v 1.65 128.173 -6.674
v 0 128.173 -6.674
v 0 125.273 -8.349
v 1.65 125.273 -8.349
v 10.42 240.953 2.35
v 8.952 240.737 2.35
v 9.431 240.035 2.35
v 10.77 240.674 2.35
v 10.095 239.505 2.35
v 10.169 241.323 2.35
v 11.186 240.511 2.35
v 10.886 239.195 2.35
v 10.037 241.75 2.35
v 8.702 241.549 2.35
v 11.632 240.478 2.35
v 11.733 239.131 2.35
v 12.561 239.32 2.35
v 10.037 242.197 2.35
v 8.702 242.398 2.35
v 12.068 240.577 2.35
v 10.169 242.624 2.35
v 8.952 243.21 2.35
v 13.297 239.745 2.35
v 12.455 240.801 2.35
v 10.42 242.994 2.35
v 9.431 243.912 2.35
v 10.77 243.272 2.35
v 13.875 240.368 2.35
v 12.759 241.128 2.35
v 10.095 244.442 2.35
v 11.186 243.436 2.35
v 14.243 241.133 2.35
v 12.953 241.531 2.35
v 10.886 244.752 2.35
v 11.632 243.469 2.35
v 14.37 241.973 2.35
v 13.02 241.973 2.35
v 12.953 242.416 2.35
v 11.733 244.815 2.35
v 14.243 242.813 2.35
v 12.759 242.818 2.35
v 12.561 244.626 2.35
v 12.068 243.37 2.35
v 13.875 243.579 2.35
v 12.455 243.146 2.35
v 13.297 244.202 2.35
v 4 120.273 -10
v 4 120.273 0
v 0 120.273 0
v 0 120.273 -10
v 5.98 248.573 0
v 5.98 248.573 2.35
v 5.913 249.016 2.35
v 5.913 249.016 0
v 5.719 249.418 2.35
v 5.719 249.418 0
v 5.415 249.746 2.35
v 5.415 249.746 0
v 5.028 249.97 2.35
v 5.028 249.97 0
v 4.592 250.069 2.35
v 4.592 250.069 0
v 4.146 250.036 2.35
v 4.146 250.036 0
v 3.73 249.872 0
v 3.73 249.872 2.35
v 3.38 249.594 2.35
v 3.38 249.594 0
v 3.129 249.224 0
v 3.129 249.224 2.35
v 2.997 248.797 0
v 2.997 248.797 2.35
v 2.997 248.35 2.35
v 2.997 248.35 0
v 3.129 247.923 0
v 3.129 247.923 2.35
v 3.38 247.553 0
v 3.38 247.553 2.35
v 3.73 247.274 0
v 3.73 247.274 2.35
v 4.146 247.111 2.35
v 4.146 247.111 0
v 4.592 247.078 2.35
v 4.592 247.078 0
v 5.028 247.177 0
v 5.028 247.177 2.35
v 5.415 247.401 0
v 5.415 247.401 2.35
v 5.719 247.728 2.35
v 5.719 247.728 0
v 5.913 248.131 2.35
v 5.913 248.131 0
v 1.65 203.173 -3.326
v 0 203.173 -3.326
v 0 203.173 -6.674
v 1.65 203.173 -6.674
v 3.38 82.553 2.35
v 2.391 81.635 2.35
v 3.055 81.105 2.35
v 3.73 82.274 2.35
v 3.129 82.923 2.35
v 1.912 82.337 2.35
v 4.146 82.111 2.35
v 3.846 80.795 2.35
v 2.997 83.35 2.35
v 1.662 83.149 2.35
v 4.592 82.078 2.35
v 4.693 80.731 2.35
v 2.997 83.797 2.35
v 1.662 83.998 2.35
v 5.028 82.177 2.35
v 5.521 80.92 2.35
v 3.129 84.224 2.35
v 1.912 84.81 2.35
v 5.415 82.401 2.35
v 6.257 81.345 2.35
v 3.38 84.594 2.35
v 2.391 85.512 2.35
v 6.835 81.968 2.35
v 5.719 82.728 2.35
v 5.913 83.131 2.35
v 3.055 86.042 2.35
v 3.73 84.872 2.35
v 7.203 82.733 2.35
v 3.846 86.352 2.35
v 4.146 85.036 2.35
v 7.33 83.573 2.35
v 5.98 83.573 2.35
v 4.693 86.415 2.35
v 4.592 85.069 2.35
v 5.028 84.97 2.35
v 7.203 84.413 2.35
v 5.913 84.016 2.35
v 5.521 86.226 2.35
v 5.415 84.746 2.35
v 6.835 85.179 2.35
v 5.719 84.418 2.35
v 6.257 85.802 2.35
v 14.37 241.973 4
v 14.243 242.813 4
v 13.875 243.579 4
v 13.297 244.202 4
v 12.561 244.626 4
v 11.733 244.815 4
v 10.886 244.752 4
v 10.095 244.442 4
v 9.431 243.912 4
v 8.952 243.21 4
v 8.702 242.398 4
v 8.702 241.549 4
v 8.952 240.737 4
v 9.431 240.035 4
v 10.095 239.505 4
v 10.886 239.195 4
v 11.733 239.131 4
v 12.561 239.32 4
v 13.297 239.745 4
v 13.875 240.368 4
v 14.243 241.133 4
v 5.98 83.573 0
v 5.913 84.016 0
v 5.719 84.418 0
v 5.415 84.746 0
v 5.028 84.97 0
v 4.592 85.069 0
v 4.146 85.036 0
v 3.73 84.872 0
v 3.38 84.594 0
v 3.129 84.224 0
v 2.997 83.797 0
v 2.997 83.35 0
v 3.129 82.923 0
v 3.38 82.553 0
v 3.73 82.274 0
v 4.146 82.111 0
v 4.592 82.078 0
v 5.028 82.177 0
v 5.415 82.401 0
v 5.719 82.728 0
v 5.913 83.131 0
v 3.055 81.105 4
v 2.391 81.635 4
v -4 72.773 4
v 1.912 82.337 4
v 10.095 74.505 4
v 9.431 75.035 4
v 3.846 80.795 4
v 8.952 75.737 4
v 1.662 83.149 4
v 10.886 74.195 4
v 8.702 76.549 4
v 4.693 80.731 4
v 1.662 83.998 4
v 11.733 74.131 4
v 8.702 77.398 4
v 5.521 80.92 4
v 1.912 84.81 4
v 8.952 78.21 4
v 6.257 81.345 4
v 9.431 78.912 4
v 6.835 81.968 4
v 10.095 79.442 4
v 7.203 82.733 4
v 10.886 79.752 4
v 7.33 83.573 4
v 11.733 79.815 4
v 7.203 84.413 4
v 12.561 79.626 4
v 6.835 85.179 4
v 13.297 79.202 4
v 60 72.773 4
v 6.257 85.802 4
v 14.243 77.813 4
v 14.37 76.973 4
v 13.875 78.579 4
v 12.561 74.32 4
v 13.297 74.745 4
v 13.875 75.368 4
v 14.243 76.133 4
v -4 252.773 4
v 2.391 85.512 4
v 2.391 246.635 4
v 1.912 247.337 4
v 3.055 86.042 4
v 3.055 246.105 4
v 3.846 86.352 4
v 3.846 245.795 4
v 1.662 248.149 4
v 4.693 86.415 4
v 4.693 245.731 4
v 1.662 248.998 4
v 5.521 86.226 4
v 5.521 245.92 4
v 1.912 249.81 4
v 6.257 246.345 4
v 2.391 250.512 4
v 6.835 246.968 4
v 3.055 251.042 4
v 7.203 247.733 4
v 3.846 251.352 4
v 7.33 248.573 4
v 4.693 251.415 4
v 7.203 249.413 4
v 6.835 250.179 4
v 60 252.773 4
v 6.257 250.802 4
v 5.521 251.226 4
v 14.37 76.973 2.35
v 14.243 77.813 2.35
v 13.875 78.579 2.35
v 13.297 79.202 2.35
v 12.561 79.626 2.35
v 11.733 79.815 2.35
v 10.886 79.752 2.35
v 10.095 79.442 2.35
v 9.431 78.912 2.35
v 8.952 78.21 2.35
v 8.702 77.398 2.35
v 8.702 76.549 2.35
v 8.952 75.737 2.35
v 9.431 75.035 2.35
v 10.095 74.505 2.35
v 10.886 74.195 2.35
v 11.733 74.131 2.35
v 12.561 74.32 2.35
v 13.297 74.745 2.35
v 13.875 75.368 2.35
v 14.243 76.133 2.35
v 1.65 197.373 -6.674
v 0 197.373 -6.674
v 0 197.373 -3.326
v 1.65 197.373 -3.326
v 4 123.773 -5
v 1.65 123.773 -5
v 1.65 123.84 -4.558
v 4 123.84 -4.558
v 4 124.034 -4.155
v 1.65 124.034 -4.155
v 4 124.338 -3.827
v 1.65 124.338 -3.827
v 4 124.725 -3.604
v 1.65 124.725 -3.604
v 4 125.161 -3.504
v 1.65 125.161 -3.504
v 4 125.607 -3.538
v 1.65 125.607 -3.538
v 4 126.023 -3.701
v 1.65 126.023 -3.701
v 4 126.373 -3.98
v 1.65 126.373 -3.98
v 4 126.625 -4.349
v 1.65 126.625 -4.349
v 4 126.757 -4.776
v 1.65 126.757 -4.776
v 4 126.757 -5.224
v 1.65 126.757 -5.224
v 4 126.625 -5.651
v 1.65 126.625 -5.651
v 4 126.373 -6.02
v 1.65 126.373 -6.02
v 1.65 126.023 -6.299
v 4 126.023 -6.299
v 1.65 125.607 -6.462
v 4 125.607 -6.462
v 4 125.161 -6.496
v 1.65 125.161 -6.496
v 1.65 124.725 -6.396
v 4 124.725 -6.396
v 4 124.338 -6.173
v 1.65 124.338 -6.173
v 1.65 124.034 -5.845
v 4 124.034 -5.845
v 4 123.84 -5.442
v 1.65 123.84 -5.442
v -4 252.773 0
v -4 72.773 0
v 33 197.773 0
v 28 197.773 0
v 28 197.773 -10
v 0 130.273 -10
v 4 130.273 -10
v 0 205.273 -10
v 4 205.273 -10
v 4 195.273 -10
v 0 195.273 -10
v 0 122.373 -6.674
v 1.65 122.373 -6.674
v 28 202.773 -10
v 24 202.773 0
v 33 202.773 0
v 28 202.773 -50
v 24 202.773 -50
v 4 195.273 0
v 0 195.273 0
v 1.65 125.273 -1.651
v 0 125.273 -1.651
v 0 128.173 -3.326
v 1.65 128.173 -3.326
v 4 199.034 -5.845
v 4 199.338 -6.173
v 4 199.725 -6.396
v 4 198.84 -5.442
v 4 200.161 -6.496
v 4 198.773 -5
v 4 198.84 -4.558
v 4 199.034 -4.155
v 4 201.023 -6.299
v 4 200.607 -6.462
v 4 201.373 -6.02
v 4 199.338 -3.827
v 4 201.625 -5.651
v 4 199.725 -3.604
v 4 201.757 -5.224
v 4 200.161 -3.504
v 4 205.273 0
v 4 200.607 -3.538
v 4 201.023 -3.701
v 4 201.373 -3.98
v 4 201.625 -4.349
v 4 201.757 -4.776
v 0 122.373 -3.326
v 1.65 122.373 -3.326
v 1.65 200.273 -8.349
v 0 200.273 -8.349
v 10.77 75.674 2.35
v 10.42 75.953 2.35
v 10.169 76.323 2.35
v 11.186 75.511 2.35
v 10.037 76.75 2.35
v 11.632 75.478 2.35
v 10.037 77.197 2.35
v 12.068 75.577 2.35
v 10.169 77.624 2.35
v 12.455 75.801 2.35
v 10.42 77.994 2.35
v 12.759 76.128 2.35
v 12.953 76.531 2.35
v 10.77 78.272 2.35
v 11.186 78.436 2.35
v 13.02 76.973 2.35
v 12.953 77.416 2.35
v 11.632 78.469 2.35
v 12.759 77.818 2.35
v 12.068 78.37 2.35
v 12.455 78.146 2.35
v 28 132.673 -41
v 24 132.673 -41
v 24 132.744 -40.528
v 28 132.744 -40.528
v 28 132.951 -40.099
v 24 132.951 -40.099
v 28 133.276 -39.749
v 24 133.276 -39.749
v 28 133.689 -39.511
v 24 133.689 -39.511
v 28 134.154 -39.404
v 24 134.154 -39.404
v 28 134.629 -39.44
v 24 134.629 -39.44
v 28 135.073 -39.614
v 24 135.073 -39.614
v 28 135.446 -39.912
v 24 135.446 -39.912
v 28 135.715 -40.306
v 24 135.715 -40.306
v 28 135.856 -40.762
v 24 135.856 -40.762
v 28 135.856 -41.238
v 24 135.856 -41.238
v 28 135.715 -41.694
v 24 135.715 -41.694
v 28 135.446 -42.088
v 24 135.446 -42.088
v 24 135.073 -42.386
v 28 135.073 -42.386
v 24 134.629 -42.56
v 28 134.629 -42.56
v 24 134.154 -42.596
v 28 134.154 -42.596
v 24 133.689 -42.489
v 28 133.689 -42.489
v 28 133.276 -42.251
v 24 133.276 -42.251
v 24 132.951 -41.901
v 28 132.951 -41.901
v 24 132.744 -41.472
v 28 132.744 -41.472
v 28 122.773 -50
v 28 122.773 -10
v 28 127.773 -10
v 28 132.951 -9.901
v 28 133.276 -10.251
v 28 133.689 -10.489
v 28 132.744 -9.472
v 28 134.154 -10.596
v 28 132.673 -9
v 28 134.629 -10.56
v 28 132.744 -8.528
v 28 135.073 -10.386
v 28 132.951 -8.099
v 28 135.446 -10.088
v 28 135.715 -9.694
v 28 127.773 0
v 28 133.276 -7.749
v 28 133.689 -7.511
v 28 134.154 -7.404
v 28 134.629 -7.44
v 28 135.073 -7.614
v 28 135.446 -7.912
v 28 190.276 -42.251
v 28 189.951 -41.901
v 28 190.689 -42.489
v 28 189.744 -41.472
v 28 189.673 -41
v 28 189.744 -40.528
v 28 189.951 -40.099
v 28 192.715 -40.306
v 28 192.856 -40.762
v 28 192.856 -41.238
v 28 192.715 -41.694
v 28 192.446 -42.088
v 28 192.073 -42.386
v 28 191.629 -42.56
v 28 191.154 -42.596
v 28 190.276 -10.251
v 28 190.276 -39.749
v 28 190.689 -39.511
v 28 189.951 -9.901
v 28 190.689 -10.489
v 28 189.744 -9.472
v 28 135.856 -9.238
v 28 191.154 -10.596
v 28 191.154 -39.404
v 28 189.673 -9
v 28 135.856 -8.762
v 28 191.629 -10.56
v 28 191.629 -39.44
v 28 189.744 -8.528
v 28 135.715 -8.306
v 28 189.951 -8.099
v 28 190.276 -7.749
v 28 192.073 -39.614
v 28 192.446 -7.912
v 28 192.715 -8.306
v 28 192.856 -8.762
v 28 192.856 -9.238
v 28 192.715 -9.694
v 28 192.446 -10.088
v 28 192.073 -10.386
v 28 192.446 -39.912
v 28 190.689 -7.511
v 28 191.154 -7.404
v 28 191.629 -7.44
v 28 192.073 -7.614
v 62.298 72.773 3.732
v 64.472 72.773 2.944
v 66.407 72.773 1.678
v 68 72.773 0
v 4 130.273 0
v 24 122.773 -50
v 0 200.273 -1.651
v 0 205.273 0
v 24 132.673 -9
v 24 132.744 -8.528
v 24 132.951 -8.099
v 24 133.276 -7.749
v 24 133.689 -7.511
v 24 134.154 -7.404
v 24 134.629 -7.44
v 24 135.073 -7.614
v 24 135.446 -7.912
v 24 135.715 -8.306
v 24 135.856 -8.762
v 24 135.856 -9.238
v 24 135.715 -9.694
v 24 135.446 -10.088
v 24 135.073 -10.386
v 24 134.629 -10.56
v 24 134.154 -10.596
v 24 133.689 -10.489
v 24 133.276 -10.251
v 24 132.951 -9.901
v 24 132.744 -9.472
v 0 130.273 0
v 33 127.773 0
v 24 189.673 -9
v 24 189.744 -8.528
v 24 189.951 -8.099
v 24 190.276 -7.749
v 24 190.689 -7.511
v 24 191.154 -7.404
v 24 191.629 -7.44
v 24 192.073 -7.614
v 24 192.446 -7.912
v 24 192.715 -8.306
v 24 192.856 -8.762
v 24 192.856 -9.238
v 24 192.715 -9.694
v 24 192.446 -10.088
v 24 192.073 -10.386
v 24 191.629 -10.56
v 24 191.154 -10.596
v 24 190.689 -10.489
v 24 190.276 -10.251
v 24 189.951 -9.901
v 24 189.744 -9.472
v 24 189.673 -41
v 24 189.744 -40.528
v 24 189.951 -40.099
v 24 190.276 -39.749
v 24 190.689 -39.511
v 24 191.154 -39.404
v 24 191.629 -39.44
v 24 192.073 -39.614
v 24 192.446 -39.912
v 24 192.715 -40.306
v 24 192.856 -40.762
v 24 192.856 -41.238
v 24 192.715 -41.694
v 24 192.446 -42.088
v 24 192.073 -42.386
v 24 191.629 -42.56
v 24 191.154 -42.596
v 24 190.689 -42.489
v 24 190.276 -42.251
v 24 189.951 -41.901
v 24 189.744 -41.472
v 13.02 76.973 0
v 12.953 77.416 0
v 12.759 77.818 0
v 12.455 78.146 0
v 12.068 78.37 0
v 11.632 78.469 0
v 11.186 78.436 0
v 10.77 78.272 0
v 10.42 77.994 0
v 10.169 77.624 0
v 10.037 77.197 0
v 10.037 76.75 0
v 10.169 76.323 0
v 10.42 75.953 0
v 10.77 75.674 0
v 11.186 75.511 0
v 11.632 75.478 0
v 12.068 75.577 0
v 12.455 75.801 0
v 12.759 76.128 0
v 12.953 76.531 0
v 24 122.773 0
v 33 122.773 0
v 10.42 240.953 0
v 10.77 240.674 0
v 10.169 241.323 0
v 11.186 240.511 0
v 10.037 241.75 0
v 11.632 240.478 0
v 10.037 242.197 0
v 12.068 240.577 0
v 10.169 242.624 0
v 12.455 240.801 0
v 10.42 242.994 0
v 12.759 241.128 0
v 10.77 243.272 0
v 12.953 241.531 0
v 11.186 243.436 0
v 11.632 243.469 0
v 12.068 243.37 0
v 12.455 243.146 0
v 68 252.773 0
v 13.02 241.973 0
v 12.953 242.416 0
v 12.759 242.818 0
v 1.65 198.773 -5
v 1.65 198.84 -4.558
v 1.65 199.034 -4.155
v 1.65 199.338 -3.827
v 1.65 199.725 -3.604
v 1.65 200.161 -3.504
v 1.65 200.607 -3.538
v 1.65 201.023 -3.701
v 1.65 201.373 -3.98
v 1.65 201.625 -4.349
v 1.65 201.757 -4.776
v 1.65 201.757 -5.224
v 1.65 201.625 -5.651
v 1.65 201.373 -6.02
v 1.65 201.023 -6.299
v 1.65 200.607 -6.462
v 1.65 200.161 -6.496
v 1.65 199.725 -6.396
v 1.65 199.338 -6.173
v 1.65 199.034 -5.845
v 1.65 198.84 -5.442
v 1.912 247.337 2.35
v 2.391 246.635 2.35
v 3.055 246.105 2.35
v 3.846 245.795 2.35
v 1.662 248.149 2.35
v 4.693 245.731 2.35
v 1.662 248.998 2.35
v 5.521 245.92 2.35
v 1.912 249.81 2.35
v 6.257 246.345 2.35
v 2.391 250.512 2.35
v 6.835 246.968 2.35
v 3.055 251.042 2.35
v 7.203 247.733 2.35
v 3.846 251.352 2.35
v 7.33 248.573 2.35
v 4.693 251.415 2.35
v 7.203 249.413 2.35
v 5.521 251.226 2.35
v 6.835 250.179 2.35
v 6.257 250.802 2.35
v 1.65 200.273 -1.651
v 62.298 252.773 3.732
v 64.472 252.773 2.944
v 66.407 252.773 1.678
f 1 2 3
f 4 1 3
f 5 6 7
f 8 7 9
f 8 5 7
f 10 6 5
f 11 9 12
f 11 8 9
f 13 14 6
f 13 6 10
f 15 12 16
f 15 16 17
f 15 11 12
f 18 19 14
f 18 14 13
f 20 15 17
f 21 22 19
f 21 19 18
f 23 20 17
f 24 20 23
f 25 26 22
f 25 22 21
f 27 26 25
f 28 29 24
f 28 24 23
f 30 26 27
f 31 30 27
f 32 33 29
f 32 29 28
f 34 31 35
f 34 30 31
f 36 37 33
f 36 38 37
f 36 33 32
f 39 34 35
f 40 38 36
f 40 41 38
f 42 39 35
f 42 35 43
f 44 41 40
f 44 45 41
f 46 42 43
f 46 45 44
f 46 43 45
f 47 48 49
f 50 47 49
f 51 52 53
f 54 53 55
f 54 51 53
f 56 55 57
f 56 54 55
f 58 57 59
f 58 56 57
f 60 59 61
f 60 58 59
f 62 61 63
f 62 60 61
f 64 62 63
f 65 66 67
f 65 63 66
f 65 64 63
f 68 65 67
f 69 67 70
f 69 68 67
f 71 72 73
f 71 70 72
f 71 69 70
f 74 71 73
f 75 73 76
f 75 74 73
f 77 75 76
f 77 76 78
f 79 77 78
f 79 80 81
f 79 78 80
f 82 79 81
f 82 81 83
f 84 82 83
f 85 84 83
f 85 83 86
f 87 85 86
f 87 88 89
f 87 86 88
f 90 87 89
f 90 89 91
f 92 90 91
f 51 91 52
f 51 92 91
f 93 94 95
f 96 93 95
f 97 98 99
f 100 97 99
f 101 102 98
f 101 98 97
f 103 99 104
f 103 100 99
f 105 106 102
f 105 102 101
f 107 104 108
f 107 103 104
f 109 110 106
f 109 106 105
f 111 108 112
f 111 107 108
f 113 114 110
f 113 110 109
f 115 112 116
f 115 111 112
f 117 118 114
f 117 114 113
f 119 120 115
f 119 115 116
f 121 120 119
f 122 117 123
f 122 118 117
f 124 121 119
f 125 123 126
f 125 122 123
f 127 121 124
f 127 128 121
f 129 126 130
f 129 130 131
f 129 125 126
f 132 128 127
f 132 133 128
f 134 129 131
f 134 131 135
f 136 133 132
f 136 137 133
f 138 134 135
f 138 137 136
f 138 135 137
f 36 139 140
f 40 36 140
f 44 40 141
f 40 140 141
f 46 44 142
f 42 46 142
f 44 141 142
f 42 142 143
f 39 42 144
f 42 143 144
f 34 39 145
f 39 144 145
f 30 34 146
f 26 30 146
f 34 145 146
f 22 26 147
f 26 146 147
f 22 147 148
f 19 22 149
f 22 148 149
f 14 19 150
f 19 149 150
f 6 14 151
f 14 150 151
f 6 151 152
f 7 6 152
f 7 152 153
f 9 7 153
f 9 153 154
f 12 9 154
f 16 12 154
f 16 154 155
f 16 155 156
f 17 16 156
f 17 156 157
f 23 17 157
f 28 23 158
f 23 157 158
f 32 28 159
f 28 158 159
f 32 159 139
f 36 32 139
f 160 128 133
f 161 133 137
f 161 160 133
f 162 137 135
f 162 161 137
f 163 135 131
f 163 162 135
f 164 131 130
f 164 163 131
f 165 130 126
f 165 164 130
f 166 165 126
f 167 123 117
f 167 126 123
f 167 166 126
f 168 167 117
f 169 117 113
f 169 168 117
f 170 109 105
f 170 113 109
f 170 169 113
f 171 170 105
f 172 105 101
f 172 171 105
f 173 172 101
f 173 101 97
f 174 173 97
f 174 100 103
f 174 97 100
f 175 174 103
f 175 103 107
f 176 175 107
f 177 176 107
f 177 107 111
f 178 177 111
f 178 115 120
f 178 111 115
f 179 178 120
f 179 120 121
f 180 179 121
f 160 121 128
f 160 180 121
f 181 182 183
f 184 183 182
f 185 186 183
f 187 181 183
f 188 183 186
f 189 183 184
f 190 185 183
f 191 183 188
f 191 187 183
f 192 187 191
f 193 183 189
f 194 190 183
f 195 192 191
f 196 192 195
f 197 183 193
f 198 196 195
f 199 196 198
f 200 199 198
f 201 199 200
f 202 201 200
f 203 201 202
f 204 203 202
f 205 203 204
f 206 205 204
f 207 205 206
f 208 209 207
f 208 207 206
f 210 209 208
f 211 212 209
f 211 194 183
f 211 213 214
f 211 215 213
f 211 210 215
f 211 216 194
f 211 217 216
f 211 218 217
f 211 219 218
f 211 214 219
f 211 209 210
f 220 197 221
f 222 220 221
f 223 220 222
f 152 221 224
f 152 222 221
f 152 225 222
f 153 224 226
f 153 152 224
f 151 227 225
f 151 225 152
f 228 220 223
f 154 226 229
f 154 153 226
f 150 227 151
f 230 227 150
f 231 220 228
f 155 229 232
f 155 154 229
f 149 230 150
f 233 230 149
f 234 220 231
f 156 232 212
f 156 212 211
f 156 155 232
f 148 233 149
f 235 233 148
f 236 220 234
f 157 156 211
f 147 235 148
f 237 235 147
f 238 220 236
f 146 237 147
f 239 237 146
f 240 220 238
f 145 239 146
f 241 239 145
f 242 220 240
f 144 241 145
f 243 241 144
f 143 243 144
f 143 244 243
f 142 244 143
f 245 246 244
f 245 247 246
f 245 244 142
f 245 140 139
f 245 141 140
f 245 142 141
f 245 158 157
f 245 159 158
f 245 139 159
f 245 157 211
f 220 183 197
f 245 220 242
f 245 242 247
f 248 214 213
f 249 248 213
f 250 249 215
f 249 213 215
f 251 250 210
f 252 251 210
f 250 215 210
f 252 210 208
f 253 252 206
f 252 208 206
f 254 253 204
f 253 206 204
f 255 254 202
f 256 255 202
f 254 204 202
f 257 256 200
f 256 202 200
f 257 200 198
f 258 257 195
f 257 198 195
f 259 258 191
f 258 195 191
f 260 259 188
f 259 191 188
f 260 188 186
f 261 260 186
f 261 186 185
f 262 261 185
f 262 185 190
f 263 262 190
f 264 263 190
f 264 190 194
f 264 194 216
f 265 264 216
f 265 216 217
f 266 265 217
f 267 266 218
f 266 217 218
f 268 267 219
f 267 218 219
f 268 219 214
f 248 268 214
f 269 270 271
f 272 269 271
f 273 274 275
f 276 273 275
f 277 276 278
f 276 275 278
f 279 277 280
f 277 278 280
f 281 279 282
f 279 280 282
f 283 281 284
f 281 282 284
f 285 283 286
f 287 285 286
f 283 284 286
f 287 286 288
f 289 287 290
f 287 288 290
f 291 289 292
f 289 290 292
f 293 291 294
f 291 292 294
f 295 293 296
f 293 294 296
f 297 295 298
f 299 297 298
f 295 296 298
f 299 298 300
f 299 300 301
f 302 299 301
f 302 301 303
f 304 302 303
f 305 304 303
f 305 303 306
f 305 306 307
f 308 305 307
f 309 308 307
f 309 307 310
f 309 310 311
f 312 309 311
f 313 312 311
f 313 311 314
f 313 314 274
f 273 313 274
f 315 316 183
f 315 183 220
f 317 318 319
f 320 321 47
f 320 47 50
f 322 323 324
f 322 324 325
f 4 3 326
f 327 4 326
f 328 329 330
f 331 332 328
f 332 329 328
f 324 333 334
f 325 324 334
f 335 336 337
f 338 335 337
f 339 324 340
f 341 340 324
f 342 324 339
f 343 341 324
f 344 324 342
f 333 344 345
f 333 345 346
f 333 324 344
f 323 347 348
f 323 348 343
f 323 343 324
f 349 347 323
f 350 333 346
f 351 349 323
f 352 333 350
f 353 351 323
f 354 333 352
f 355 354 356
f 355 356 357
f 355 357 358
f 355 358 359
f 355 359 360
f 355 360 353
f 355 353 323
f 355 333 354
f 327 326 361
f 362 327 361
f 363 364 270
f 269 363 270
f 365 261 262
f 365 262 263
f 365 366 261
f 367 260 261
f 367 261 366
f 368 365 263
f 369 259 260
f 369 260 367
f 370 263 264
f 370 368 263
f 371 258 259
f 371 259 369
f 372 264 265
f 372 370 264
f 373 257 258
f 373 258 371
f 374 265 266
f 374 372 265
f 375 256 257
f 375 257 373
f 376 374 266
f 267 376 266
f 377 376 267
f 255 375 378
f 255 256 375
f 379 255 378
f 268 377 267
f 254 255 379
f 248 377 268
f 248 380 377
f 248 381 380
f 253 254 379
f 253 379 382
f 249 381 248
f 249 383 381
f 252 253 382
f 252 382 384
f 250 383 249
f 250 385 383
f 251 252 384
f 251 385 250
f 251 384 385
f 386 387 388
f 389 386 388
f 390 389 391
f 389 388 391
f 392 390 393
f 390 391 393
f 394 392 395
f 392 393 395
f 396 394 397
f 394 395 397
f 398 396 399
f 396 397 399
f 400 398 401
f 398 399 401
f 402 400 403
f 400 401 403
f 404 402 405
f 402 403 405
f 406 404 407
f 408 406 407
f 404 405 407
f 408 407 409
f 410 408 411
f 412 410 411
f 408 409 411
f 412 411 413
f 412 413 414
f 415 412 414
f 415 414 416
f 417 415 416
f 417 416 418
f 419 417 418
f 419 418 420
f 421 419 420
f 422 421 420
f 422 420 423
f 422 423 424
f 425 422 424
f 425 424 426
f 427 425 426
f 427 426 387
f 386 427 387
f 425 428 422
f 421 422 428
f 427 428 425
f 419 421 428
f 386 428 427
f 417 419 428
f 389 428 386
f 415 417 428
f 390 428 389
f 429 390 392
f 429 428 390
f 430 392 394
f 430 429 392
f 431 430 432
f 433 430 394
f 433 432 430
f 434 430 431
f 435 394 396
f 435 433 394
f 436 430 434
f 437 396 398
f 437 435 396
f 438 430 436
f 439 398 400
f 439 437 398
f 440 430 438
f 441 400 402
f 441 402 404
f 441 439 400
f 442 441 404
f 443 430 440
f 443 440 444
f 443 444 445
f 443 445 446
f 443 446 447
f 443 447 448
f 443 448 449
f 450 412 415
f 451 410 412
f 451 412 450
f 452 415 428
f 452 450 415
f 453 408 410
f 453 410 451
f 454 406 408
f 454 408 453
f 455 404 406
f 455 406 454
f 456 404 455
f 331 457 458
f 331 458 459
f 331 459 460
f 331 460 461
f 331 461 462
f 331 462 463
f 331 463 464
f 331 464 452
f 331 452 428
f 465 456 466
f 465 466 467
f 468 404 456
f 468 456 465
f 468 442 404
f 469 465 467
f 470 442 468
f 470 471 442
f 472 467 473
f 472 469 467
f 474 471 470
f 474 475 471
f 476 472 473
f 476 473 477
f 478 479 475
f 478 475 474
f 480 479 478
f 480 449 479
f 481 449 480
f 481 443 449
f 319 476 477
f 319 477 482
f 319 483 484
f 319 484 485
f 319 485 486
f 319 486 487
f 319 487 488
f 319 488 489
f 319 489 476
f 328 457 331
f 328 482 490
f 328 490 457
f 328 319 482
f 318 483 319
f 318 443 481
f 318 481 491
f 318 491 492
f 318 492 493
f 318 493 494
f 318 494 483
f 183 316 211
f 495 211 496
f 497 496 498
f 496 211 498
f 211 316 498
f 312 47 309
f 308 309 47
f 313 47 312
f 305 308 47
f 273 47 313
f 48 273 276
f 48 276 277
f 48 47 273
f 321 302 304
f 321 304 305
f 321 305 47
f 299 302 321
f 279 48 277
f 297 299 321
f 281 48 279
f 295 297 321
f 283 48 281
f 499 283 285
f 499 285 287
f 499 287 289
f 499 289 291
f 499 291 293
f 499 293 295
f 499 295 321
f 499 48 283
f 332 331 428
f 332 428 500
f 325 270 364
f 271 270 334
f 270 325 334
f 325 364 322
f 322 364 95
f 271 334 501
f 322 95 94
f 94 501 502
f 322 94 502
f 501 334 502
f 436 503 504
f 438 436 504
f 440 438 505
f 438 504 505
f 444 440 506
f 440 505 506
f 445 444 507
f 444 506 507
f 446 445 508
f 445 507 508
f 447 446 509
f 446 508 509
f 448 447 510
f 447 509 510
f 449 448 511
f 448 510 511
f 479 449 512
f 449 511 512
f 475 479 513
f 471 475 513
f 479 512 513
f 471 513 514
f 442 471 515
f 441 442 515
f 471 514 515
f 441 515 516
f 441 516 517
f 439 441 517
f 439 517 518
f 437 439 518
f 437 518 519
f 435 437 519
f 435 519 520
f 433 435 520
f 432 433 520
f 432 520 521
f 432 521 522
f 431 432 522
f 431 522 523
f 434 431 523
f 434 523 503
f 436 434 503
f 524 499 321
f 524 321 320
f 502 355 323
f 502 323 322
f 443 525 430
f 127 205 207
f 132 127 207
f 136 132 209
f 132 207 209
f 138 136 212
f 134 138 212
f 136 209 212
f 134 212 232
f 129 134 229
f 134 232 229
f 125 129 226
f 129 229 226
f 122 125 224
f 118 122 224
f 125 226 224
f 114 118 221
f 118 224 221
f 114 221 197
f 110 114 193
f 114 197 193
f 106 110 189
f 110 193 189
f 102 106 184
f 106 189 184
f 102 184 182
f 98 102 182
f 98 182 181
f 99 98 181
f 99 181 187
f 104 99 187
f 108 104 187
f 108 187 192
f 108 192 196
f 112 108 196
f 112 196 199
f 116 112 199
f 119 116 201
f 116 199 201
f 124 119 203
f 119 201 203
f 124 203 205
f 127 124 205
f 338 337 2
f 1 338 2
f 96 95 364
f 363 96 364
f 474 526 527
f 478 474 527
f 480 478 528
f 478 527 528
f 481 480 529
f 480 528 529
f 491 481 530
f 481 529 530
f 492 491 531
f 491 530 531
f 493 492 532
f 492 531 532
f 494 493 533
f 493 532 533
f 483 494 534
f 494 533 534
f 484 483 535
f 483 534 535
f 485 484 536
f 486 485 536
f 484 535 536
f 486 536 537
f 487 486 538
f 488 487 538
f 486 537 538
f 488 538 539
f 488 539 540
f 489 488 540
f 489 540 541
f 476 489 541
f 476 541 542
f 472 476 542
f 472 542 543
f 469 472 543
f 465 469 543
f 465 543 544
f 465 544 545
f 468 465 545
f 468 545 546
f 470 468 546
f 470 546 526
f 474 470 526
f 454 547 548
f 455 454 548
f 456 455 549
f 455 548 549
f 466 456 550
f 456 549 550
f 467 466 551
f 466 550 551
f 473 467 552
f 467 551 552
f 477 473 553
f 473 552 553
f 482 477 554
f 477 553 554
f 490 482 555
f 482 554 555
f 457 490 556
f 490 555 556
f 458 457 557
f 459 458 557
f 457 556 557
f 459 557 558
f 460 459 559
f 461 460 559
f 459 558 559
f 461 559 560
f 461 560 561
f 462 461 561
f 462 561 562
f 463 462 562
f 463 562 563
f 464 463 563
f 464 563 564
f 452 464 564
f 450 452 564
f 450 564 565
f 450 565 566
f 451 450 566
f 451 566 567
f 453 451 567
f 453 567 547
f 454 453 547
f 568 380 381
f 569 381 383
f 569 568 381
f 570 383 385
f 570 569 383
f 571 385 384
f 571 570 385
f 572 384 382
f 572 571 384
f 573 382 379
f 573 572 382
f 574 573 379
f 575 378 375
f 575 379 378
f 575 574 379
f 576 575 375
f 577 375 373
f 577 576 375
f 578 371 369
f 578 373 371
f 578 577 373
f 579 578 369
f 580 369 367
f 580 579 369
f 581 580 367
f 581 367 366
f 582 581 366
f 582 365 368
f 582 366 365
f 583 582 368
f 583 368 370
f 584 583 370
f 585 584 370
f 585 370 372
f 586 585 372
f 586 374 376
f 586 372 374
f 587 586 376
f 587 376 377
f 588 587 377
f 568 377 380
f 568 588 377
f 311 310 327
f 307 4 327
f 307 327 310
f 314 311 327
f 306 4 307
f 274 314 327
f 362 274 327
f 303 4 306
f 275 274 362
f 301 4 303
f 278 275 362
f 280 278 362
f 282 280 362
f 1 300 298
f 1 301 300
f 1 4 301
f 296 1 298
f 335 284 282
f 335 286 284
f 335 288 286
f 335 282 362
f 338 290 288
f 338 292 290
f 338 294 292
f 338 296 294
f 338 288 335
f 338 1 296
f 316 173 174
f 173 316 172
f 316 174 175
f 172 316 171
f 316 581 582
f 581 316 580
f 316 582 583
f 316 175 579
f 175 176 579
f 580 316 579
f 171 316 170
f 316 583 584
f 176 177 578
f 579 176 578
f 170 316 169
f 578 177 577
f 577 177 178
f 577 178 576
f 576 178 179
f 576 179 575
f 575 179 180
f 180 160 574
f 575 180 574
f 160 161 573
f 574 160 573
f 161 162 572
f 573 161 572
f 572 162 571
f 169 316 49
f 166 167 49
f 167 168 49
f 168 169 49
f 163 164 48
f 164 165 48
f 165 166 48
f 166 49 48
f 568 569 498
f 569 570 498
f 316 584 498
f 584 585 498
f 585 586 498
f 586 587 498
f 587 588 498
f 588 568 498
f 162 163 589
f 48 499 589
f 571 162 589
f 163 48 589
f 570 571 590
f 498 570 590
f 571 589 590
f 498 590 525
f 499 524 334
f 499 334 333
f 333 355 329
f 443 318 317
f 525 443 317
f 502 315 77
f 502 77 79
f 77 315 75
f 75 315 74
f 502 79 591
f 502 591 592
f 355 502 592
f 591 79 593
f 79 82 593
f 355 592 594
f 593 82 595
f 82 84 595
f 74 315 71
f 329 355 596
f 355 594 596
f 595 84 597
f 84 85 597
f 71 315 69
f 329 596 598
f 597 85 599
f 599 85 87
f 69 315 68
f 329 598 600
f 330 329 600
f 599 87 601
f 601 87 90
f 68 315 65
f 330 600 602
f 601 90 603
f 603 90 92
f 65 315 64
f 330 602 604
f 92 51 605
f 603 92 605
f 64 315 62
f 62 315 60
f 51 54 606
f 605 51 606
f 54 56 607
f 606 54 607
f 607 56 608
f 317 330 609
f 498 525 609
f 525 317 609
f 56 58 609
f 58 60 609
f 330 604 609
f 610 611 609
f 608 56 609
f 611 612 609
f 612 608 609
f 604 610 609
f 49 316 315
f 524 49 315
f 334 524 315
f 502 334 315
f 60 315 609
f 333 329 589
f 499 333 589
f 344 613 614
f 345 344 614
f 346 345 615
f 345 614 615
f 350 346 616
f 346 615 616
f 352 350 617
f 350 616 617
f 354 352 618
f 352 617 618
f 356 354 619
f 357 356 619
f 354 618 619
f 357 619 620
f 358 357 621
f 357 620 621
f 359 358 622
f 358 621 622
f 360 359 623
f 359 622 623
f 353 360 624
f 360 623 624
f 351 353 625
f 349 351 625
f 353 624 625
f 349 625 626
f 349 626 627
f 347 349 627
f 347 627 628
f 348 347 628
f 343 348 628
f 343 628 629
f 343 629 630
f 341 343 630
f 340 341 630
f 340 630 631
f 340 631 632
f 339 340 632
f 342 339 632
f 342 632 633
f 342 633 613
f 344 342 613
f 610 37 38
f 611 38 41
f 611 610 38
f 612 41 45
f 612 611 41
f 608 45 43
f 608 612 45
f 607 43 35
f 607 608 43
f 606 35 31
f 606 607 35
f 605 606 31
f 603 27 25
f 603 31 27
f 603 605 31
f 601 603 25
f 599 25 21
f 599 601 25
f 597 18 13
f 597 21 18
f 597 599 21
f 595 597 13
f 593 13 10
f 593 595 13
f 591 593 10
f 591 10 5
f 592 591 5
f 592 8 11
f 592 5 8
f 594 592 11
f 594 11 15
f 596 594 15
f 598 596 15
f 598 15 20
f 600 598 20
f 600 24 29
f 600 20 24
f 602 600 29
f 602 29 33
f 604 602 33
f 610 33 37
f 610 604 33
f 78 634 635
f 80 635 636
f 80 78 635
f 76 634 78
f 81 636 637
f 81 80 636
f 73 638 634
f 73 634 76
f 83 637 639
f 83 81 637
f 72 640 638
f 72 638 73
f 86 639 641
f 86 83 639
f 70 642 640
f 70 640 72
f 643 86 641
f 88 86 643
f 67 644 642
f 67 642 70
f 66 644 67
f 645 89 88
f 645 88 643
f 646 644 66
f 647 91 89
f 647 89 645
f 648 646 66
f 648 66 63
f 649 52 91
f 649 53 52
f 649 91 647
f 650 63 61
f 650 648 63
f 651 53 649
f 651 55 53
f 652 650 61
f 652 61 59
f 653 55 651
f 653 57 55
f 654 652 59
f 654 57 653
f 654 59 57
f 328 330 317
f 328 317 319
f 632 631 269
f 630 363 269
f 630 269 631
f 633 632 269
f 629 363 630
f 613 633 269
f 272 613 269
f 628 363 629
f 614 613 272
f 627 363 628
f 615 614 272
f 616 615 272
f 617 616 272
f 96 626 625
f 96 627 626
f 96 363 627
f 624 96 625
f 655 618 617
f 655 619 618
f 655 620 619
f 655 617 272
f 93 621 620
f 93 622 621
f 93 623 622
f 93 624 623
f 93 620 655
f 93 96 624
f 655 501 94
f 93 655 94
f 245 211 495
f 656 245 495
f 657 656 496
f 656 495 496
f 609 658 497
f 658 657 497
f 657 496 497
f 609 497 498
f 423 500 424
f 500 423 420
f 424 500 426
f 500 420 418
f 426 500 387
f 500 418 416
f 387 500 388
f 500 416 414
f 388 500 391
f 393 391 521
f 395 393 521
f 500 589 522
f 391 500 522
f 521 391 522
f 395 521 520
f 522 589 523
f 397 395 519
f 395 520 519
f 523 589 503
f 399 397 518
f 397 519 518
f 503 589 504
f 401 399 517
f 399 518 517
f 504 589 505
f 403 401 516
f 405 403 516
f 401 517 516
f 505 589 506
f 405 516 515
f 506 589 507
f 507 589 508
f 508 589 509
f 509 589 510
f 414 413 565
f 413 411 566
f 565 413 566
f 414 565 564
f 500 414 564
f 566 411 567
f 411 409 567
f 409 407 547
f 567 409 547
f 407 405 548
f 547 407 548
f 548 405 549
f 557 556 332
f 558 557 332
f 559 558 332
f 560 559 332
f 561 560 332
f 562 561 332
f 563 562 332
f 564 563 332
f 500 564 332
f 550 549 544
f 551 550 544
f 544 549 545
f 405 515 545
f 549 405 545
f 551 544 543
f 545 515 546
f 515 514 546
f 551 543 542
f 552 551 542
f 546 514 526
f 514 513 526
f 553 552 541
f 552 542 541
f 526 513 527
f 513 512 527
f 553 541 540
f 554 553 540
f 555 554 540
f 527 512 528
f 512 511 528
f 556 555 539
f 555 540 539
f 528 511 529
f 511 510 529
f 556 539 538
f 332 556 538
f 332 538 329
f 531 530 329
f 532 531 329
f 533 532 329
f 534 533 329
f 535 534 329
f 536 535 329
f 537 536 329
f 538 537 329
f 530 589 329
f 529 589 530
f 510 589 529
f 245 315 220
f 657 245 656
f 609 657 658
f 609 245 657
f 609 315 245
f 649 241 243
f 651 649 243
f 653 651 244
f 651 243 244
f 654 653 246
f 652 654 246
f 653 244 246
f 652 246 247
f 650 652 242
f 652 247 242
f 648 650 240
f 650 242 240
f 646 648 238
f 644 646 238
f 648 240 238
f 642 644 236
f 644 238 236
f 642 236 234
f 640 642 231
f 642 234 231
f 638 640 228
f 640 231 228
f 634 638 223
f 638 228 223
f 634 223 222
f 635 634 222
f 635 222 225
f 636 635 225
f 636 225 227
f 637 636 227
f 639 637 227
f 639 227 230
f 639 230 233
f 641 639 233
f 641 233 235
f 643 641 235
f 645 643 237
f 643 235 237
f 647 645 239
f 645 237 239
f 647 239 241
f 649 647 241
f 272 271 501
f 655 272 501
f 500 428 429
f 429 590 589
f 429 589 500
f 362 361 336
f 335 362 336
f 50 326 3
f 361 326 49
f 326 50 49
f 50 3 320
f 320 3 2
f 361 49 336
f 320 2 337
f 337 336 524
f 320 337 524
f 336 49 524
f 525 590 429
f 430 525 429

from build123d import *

# Parameters (mm, degrees)
CROQUIS1_W              = 72
CROQUIS1_H              = 180
CROQUIS1_R              = 2.85
CROQUIS1_R_2            = 1.5
SALIENTE_EXTRUIR1_DEPTH = 4
CROQUIS2_R              = 2.85
CORTAR_EXTRUIR1_DEPTH   = 1.65
CROQUIS3_W              = 4
CROQUIS3_H              = 10
SALIENTE_EXTRUIR2_DEPTH = 10
CORTAR_EXTRUIR2_REACH   = 263.951
CROQUIS4_R              = 1.5
CROQUIS4_3_R            = 1.5
CORTAR_EXTRUIR3_DEPTH   = 1.65
REDONDEO3_R             = 10
CROQUIS5_W              = 4
CROQUIS5_H              = 80
SALIENTE_EXTRUIR3_DEPTH = 50
SALIENTE_EXTRUIR4_DEPTH = 5
SALIENTE_EXTRUIR5_DEPTH = 5
CORTAR_EXTRUIR4_REACH   = 263.401
CROQUIS9_R              = 1.6


with BuildPart() as part:
    # Croquis1 → Saliente-Extruir1 (new body)
    # profile 1 of 5: a face of its own
    with BuildSketch(Plane.XY):
        with Locations((32, 162.773389683)):
            Rectangle(CROQUIS1_W, CROQUIS1_H)
        with Locations((4.48, 83.573389683)):
            Circle(CROQUIS1_R, mode=Mode.SUBTRACT)
        with Locations((11.52, 76.973389683)):
            Circle(CROQUIS1_R, mode=Mode.SUBTRACT)
        with Locations((11.52, 241.973389683)):
            Circle(CROQUIS1_R, mode=Mode.SUBTRACT)
        with Locations((4.48, 248.573389683)):
            Circle(CROQUIS1_R, mode=Mode.SUBTRACT)
    # profile 2 of 5: a face of its own
    with BuildSketch(Plane.XY):
        with Locations((4.48, 83.573389683)):
            Circle(CROQUIS1_R)
        with Locations((4.48, 83.573389683)):
            Circle(CROQUIS1_R_2, mode=Mode.SUBTRACT)
    # profile 3 of 5: a face of its own
    with BuildSketch(Plane.XY):
        with Locations((11.52, 76.973389683)):
            Circle(CROQUIS1_R)
        with Locations((11.52, 76.973389683)):
            Circle(CROQUIS1_R_2, mode=Mode.SUBTRACT)
    # profile 4 of 5: a face of its own
    with BuildSketch(Plane.XY):
        with Locations((11.52, 241.973389683)):
            Circle(CROQUIS1_R)
        with Locations((11.52, 241.973389683)):
            Circle(CROQUIS1_R_2, mode=Mode.SUBTRACT)
    # profile 5 of 5: a face of its own
    with BuildSketch(Plane.XY):
        with Locations((4.48, 248.573389683)):
            Circle(CROQUIS1_R)
        with Locations((4.48, 248.573389683)):
            Circle(CROQUIS1_R_2, mode=Mode.SUBTRACT)
    extrude(amount=SALIENTE_EXTRUIR1_DEPTH)

    # Croquis2 → Cortar-Extruir1 (cut)
    with BuildSketch(Plane.XY.offset(4)):
        with Locations((4.48, 248.573389683)):
            Circle(CROQUIS2_R)
        with Locations((11.52, 241.973389683)):
            Circle(CROQUIS2_R)
        with Locations((4.48, 83.573389683)):
            Circle(CROQUIS2_R)
        with Locations((11.52, 76.973389683)):
            Circle(CROQUIS2_R)
    extrude(amount=-CORTAR_EXTRUIR1_DEPTH, mode=Mode.SUBTRACT)

    # Croquis3 → Saliente-Extruir2 (add)
    with BuildSketch(Plane(origin=(0, 0, 0), x_dir=(-1, 0, 0), z_dir=(0, 0, -1))):
        with Locations((-2, 200.273389683)):
            Rectangle(CROQUIS3_W, CROQUIS3_H)
        with Locations((-2, 125.273389683)):
            Rectangle(CROQUIS3_W, CROQUIS3_H)
    extrude(amount=SALIENTE_EXTRUIR2_DEPTH)

    # Croquis4 → Cortar-Extruir2 (cut, up to next)
    with BuildSketch(Plane.ZY, mode=Mode.PRIVATE) as cortar_extruir2_sk1:
        with Locations(Location((-5, 125.273389683, 0), (0, 0, 270))):
            Circle(CROQUIS4_R)
    cortar_extruir2_tool1 = extrude(cortar_extruir2_sk1.sketch, amount=-CORTAR_EXTRUIR2_REACH, mode=Mode.PRIVATE) & part.part
    # Croquis4 → Cortar-Extruir2 (cut, up to next)
    with BuildSketch(Plane.ZY, mode=Mode.PRIVATE) as cortar_extruir2_sk2:
        with Locations(Location((-5, 200.273389683, 0), (0, 0, 270))):
            Circle(CROQUIS4_R)
    cortar_extruir2_tool2 = extrude(cortar_extruir2_sk2.sketch, amount=-CORTAR_EXTRUIR2_REACH, mode=Mode.PRIVATE) & part.part
    add(cortar_extruir2_tool1.solids().sort_by_distance((0, 125.27339, -5))[0], mode=Mode.SUBTRACT)
    add(cortar_extruir2_tool2.solids().sort_by_distance((0, 200.27339, -5))[0], mode=Mode.SUBTRACT)

    # Croquis4<3> → Cortar-Extruir3 (cut)
    # profile 1 of 2: a face of its own
    with BuildSketch(Plane.ZY):
        Polygon((-8.348631561, 200.273389683), (-6.674315781, 197.373389683), (-3.325684219, 197.373389683), (-1.651368439, 200.273389683), (-3.325684219, 203.173389683), (-6.674315781, 203.173389683), align=None)
        with Locations(Location((-5, 200.273389683, 0), (0, 0, 270))):
            Circle(CROQUIS4_3_R, mode=Mode.SUBTRACT)
    # profile 2 of 2: a face of its own
    with BuildSketch(Plane.ZY):
        Polygon((-8.348631561, 125.273389683), (-6.674315781, 122.373389683), (-3.325684219, 122.373389683), (-1.651368439, 125.273389683), (-3.325684219, 128.173389683), (-6.674315781, 128.173389683), align=None)
        with Locations(Location((-5, 125.273389683, 0), (0, 0, 270))):
            Circle(CROQUIS4_3_R, mode=Mode.SUBTRACT)
    extrude(amount=-CORTAR_EXTRUIR3_DEPTH, mode=Mode.SUBTRACT)

    # Redondeo3
    # the kernel refuses this fillet: 10 mm, written as the material it takes off along each edge
    with BuildSketch(Plane(origin=(68, 52.773389683, 4), x_dir=(0, 0, -1), z_dir=(0, 1, 0))) as redondeo3_piece_1:
        with BuildLine():
            CenterArc((10, 8), REDONDEO3_R, 180, 53.130102354)
            Line((0, 8), (-0.2, 8))
            Line((-0.2, 8), (-0.2, 0))
            Line((-0.2, 0), (0, -0.2))
            ThreePointArc((0, -0.2), (2, -0.2), (3.88, -0.16))
            Line((3.88, -0.16), (4, 0))
        make_face()
    extrude(amount=220, mode=Mode.SUBTRACT)

    # Croquis5 → Saliente-Extruir3 (add)
    with BuildSketch(Plane(origin=(0, 0, 0), x_dir=(-1, 0, 0), z_dir=(0, 0, -1))):
        with Locations((-26, 162.773389683)):
            Rectangle(CROQUIS5_W, CROQUIS5_H)
    extrude(amount=SALIENTE_EXTRUIR3_DEPTH)

    # Croquis6 → Saliente-Extruir4 (add)
    with BuildSketch(Plane(origin=(0, 202.773389683, 0), x_dir=(1, 0, 0), z_dir=(0, 1, 0))):
        Polygon((28, 0), (33, 0), (28, 10), align=None)
    extrude(amount=-SALIENTE_EXTRUIR4_DEPTH)

    # Croquis7 → Saliente-Extruir5 (add)
    with BuildSketch(Plane.XZ.offset(-122.773389683)):
        Polygon((28, 0), (33, 0), (28, -10), align=None)
    extrude(amount=-SALIENTE_EXTRUIR5_DEPTH)

    # Croquis9 → Cortar-Extruir4 (cut, up to next)
    with BuildSketch(Plane.ZY.offset(-24), mode=Mode.PRIVATE) as cortar_extruir4_sk1:
        with Locations(Location((-9, 191.273389683, 0), (0, 0, 270))):
            Circle(CROQUIS9_R)
    cortar_extruir4_tool1 = extrude(cortar_extruir4_sk1.sketch, amount=-CORTAR_EXTRUIR4_REACH, mode=Mode.PRIVATE) & part.part
    # Croquis9 → Cortar-Extruir4 (cut, up to next)
    with BuildSketch(Plane.ZY.offset(-24), mode=Mode.PRIVATE) as cortar_extruir4_sk2:
        with Locations(Location((-41, 191.273389683, 0), (0, 0, 270))):
            Circle(CROQUIS9_R)
    cortar_extruir4_tool2 = extrude(cortar_extruir4_sk2.sketch, amount=-CORTAR_EXTRUIR4_REACH, mode=Mode.PRIVATE) & part.part
    # Croquis9 → Cortar-Extruir4 (cut, up to next)
    with BuildSketch(Plane.ZY.offset(-24), mode=Mode.PRIVATE) as cortar_extruir4_sk3:
        with Locations(Location((-41, 134.273389683, 0), (0, 0, 270))):
            Circle(CROQUIS9_R)
    cortar_extruir4_tool3 = extrude(cortar_extruir4_sk3.sketch, amount=-CORTAR_EXTRUIR4_REACH, mode=Mode.PRIVATE) & part.part
    # Croquis9 → Cortar-Extruir4 (cut, up to next)
    with BuildSketch(Plane.ZY.offset(-24), mode=Mode.PRIVATE) as cortar_extruir4_sk4:
        with Locations(Location((-9, 134.273389683, 0), (0, 0, 270))):
            Circle(CROQUIS9_R)
    cortar_extruir4_tool4 = extrude(cortar_extruir4_sk4.sketch, amount=-CORTAR_EXTRUIR4_REACH, mode=Mode.PRIVATE) & part.part
    add(cortar_extruir4_tool1.solids().sort_by_distance((24, 191.27339, -9))[0], mode=Mode.SUBTRACT)
    add(cortar_extruir4_tool2.solids().sort_by_distance((24, 191.27339, -41))[0], mode=Mode.SUBTRACT)
    add(cortar_extruir4_tool3.solids().sort_by_distance((24, 134.27339, -41))[0], mode=Mode.SUBTRACT)
    add(cortar_extruir4_tool4.solids().sort_by_distance((24, 134.27339, -9))[0], mode=Mode.SUBTRACT)


solid = part.part
